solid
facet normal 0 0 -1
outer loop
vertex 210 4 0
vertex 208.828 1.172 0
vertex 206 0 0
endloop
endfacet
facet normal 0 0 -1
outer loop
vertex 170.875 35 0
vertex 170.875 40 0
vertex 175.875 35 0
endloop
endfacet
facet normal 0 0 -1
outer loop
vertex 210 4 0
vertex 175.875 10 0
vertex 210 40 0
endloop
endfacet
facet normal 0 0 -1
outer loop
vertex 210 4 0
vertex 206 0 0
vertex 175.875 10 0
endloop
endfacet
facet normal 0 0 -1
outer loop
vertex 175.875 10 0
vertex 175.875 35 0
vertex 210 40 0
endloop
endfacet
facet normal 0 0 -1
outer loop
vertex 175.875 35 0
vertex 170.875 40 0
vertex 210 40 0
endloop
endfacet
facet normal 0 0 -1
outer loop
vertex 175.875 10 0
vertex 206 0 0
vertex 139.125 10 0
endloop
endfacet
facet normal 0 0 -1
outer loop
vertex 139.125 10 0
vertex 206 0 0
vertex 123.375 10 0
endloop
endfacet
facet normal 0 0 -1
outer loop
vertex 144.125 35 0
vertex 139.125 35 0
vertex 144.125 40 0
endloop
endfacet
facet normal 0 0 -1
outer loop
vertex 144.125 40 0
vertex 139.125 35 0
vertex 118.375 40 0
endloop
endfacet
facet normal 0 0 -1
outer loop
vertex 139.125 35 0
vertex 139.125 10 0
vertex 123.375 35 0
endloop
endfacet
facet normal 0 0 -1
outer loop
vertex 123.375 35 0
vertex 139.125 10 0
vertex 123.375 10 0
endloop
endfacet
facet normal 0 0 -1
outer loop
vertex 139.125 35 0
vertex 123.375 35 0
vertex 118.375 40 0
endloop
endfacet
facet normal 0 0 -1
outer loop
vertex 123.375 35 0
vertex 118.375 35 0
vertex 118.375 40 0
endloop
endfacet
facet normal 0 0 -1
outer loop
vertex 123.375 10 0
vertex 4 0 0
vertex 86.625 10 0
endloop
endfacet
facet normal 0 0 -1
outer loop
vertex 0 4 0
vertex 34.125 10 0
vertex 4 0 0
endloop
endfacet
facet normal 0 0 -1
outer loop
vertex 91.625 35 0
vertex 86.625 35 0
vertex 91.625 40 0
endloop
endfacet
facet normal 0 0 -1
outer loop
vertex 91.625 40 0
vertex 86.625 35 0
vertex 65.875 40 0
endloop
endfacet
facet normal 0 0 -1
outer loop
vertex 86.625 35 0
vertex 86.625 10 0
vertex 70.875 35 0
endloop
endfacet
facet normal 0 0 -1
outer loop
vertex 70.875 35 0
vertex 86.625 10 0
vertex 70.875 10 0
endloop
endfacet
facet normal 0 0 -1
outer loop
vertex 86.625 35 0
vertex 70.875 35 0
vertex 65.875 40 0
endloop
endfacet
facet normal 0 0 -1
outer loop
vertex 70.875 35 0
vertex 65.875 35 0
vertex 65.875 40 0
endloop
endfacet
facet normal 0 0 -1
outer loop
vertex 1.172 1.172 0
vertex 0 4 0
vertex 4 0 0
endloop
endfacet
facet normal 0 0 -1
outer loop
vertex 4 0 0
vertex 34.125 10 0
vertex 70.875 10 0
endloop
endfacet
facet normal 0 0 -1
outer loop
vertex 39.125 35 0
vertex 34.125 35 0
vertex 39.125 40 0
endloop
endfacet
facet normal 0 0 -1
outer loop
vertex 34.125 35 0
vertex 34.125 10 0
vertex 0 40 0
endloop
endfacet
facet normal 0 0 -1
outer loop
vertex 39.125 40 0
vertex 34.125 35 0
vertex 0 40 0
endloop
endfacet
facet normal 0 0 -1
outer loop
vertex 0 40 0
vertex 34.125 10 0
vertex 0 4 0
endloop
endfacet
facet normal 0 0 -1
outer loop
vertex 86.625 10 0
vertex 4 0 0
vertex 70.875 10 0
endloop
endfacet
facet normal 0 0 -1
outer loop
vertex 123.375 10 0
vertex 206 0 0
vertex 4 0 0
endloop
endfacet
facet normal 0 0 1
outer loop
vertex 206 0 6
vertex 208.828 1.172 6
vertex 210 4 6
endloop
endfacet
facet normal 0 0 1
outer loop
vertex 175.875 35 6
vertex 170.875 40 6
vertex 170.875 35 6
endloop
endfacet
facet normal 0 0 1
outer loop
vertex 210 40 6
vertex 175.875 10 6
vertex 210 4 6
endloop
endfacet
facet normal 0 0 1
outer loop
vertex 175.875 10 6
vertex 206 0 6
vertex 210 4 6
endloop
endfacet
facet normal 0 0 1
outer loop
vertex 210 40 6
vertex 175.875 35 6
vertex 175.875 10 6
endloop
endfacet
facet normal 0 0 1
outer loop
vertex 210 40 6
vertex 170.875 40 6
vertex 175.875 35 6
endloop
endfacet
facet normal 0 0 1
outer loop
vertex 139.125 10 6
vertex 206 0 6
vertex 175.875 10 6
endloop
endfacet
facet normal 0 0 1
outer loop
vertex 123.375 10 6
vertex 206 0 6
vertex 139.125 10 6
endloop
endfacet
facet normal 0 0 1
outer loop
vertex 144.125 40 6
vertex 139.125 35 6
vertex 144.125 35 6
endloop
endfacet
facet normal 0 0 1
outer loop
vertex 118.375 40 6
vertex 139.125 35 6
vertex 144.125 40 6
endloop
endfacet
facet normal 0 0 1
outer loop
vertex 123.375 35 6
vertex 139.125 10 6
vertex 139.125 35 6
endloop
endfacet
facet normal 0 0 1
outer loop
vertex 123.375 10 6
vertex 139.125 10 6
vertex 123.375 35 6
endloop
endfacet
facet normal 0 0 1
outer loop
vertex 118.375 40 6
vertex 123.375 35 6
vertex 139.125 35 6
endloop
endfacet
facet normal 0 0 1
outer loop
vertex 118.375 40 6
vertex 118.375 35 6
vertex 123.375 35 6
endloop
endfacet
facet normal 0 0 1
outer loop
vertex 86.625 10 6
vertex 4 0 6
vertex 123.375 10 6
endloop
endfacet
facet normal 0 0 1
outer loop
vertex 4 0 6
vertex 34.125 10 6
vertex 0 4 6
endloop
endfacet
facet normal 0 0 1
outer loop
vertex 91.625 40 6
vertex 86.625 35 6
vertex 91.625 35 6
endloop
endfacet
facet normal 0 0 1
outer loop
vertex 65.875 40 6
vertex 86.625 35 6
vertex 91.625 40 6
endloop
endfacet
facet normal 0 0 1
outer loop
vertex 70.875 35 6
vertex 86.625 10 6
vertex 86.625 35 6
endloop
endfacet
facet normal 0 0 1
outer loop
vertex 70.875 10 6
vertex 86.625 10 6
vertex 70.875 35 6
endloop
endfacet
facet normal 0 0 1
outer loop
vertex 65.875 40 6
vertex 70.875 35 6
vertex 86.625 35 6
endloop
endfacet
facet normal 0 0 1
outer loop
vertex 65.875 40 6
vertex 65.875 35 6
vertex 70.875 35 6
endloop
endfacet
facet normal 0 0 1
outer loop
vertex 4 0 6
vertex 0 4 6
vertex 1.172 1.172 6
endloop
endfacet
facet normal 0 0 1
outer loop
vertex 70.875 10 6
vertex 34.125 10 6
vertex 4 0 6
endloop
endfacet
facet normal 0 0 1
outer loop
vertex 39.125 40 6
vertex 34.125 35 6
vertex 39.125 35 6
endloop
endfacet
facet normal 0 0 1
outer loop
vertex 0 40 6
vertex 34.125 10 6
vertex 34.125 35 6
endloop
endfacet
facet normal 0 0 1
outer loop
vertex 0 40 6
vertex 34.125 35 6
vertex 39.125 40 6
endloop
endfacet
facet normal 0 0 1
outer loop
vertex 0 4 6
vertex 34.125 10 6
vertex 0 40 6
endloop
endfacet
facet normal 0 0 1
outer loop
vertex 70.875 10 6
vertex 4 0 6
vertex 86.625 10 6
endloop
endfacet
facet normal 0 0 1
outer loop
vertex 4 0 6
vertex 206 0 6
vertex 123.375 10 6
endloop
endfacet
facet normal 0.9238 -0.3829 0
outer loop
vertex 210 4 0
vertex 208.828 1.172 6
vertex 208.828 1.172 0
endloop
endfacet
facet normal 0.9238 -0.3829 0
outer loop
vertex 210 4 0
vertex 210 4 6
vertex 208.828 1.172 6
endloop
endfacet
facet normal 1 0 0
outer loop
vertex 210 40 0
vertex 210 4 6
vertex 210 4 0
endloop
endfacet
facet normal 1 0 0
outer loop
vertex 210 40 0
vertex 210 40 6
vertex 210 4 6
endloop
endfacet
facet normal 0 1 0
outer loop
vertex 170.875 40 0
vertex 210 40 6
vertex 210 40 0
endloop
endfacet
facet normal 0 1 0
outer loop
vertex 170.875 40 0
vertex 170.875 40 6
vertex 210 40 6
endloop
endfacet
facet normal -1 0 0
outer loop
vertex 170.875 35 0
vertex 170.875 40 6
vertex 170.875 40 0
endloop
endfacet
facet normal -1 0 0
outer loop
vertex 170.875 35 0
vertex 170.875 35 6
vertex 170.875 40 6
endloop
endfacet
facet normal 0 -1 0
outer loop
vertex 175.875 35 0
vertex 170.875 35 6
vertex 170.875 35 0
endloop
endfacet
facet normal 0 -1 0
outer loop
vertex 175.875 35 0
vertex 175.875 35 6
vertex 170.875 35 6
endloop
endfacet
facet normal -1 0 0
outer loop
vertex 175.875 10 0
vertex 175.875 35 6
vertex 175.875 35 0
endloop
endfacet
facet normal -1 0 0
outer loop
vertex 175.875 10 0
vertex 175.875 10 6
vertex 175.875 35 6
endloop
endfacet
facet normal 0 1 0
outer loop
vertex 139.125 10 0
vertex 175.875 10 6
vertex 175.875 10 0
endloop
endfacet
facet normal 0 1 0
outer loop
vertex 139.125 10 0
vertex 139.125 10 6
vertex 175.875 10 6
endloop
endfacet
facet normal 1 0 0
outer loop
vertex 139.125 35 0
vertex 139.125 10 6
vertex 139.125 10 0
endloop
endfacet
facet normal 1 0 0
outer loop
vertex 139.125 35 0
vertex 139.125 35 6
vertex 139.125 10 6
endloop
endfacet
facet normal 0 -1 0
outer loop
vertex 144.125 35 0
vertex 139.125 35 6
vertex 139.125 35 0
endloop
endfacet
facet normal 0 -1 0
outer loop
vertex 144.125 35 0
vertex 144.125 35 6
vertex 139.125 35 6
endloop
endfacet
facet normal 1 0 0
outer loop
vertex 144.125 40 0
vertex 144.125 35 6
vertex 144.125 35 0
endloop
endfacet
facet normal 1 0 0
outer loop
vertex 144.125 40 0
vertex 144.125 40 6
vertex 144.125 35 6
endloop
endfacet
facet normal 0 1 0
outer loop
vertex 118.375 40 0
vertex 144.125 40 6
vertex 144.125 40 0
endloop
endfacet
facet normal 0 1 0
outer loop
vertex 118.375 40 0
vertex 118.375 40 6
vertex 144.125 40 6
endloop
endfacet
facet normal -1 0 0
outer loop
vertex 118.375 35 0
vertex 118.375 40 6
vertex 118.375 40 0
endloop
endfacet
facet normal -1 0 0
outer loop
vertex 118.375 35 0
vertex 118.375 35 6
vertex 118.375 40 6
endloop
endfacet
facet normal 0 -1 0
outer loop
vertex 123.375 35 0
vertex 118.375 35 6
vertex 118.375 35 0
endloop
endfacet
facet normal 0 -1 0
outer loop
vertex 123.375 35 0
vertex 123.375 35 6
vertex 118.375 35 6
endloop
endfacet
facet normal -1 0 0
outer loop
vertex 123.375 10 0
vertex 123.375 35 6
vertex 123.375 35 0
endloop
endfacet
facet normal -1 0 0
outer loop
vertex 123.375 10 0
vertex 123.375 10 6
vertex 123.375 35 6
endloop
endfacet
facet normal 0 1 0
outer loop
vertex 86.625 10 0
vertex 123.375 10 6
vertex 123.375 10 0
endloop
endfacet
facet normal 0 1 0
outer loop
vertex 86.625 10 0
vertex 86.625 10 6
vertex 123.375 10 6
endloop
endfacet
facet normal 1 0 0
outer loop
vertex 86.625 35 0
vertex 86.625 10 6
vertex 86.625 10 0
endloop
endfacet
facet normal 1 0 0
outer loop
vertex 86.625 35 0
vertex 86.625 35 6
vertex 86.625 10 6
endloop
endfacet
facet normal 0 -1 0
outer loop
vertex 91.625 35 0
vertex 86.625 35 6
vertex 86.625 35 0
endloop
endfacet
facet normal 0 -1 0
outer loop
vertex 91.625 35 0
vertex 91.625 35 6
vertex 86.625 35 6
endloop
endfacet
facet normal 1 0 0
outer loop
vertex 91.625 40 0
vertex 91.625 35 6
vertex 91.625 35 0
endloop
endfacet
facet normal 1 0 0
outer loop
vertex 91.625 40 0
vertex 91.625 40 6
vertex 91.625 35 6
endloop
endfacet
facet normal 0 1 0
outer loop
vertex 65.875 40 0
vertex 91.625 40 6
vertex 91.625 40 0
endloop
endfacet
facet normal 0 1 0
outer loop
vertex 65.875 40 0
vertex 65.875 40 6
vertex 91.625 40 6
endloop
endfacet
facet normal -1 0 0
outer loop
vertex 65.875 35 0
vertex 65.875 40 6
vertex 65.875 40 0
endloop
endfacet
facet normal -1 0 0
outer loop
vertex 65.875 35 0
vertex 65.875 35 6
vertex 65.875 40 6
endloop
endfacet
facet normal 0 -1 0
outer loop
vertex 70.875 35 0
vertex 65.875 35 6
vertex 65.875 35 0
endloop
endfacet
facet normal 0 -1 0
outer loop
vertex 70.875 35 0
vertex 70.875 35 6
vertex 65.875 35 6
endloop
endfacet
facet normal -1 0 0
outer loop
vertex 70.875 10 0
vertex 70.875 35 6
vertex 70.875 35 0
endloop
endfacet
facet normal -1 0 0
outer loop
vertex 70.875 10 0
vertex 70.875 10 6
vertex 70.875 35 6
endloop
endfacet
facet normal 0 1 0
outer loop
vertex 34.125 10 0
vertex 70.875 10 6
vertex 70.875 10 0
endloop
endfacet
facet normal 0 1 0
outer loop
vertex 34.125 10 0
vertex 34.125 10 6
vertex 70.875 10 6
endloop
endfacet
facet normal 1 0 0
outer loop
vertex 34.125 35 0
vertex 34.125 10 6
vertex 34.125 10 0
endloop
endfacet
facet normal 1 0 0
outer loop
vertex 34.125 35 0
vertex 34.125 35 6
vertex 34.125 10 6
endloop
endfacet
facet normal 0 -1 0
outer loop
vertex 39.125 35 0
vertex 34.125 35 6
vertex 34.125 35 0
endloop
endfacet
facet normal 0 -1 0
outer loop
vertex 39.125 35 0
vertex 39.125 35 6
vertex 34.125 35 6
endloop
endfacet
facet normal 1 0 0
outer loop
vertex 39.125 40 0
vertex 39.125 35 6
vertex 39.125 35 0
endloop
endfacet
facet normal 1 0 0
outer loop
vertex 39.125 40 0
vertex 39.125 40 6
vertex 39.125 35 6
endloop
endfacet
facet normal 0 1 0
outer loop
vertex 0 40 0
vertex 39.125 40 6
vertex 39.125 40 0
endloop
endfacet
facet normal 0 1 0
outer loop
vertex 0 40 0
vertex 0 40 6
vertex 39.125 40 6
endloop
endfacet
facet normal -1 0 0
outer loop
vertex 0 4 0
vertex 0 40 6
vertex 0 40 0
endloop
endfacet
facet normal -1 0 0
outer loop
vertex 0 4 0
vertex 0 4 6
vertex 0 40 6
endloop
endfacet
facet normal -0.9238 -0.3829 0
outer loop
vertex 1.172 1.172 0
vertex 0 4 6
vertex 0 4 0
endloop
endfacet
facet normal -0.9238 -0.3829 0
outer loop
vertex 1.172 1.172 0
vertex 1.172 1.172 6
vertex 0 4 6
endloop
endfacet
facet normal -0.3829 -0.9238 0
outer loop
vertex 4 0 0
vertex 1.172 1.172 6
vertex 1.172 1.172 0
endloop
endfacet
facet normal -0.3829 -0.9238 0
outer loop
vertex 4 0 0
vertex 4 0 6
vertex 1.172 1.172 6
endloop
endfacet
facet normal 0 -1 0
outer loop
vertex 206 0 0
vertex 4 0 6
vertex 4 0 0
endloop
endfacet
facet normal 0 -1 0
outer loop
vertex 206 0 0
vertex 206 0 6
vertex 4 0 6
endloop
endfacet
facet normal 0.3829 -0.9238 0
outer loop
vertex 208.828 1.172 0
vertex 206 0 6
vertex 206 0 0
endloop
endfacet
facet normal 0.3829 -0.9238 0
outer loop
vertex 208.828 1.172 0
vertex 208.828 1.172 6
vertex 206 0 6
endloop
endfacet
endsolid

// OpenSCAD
$fn = 32;

// ----------------------------------------------------------------------
// Oversize slot bar: 210 mm bar with 3 oversize windows
// ----------------------------------------------------------------------

// --- parameters (mm) ---
profile_height = 6;       // extrusion height
profile_points = 32;      // points of the closed outline

profile = [[0, 4], [1.172, 1.172], [4, 0], [206, 0], [208.828, 1.172], [210, 4], [210, 40], [170.875, 40], [170.875, 35], [175.875, 35], [175.875, 10], [139.125, 10], [139.125, 35], [144.125, 35], [144.125, 40], [118.375, 40], [118.375, 35], [123.375, 35], [123.375, 10], [86.625, 10], [86.625, 35], [91.625, 35], [91.625, 40], [65.875, 40], [65.875, 35], [70.875, 35], [70.875, 10], [34.125, 10], [34.125, 35], [39.125, 35], [39.125, 40], [0, 40]];  // single closed polygon, 32 points, counter clockwise

// --- the one profile operation ---
linear_extrude(height = profile_height) polygon(points = profile);
